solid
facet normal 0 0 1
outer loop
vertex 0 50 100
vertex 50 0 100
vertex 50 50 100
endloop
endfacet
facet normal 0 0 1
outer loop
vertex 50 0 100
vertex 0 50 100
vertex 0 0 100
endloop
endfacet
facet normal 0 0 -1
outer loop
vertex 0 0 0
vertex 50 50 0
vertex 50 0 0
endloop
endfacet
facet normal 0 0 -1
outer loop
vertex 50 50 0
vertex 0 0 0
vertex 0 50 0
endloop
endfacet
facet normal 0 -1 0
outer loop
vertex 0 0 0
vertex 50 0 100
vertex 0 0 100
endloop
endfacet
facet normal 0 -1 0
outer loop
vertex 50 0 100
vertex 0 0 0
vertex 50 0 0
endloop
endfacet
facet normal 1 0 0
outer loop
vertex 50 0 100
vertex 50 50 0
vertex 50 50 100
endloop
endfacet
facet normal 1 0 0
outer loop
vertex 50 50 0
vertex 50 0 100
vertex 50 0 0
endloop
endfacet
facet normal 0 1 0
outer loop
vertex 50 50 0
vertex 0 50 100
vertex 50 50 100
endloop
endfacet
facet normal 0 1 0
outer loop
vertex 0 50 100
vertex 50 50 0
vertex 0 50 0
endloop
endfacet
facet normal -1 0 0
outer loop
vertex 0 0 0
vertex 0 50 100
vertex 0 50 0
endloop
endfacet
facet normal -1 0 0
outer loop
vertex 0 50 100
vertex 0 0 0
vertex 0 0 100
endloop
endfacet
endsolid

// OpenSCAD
// Generated by SolidPython 1.1.3 on 2024-12-13 22:35:04


cube(size = [50, 50, 100]);
/***********************************************
*********      SolidPython code:      **********
************************************************
 
import cv2
import os
from solid import cube, cylinder, sphere, union, scad_render_to_file
from solid.utils import polyhedron
import numpy as np


# Step 1: Preprocessing and Contour Detection
def preprocess_image(image_path):
    img = cv2.imread(image_path)
    if img is None:  # Check if the image was successfully loaded
        raise FileNotFoundError(f"Error: Unable to load image at '{image_path}'. Check the file path!")
    gray = cv2.cvtColor(img, cv2.COLOR_BGR2GRAY)
    _, binary = cv2.threshold(gray, 127, 255, cv2.THRESH_BINARY)
    return binary


def detect_contours(binary_img):
    contours, _ = cv2.findContours(binary_img, cv2.RETR_EXTERNAL, cv2.CHAIN_APPROX_SIMPLE)
    contours = sorted(contours, key=cv2.contourArea, reverse=True)
    return contours


# Step 2: Shape Detection Function
def detect_shape(contours):
    for contour in contours:
        epsilon = 0.04 * cv2.arcLength(contour, True)
        approx = cv2.approxPolyDP(contour, epsilon, True)
        if len(approx) == 3:
            return "Triangle"
        elif len(approx) == 4:
            (x, y, w, h) = cv2.boundingRect(approx)
            aspect_ratio = w / float(h)
            if 0.95 <= aspect_ratio <= 1.05:
                return "Square"
            else:
                return "Rectangle"
        elif len(approx) > 4:
            return "Circle"
    return "Unknown"


# Step 3: 3D Model Generation Functions
def create_pyramid(base_width, base_depth, height):
    vertices = [
        [0, 0, 0],                          # Bottom-front-left
        [base_width, 0, 0],                 # Bottom-front-right
        [base_width, base_depth, 0],        # Bottom-back-right
        [0, base_depth, 0],                 # Bottom-back-left
        [base_width / 2, base_depth / 2, height]  # Apex (centered above the base)
    ]
    faces = [
        [0, 1, 4],  # Front face
        [1, 2, 4],  # Right face
        [2, 3, 4],  # Back face
        [3, 0, 4],  # Left face
        [0, 1, 2, 3]  # Base
    ]
    return polyhedron(points=vertices, faces=faces)


def generate_3d_model(geometry_type, dimensions, output_file):
    """
    Generate a 3D model based on the detected geometry type.
    """
    width, depth, height = dimensions
    if geometry_type == "cube" or geometry_type == "square":
        model = cube([width, depth, height])
    elif geometry_type == "cylinder":
        radius = width / 2.0
        model = cylinder(r=radius, h=height)
    elif geometry_type == "sphere":
        radius = min(width, depth, height) / 2.0
        model = sphere(r=radius)
    elif geometry_type == "pyramid":
        model = create_pyramid(width, depth, height)
    else:
        raise ValueError(f"Unsupported geometry type: {geometry_type}")

    # Render and save the model
    scad_render_to_file(model, output_file)
    print(f"3D {geometry_type} model saved as '{output_file}'.")


# Main Workflow
if __name__ == "__main__":
    try:
        # Specify image paths
        image_paths = {
            "front": r"C:\Users\Akshay\Downloads\3D_Shape_Generator\3D_Shape_Generator\images\cylinderfrontview.png",
            "side": r"C:\Users\Akshay\Downloads\3D_Shape_Generator\3D_Shape_Generator\images\cylindersideview.png",
            "top": r"C:\Users\Akshay\Downloads\3D_Shape_Generator\3D_Shape_Generator\images\cylindertopview.png"
        }

        # Ensure output folder exists
        output_folder = "output"
        os.makedirs(output_folder, exist_ok=True)

        # Preprocess images
        front_img = preprocess_image(image_paths["front"])
        side_img = preprocess_image(image_paths["side"])
        top_img = preprocess_image(image_paths["top"])

        # Detect contours
        front_contours = detect_contours(front_img)
        side_contours = detect_contours(side_img)
        top_contours = detect_contours(top_img)

        # Detect shapes from contours
        front_shape = detect_shape(front_contours)
        side_shape = detect_shape(side_contours)
        top_shape = detect_shape(top_contours)

        print(f"Detected Shapes - Front: {front_shape}, Side: {side_shape}, Top: {top_shape}")

        # Define dummy dimensions (replace with actual dimension extraction if available)
        dimensions = (50, 50, 100)  # Example: width, depth, height

        # Determine shape and generate the SCAD file
        if front_shape == "Square" and top_shape == "Square" and side_shape == "Square":
            geometry_type = "cube"
        elif front_shape == "Rectangle" and top_shape == "Circle" and side_shape == "Rectangle":
            geometry_type = "cylinder"
        elif front_shape == "Triangle" and top_shape == "Circle" and side_shape == "Triangle":
            geometry_type = "pyramid"
        else:
            geometry_type = "Unknown"

        if geometry_type != "Unknown":
            output_file = os.path.join(output_folder, f"{geometry_type}_model.scad")
            generate_3d_model(geometry_type, dimensions, output_file)
        else:
            print("Unable to determine a suitable 3D shape for the detected contours.")

    except Exception as e:
        print(f"An error occurred: {e}")
 
 
************************************************/
